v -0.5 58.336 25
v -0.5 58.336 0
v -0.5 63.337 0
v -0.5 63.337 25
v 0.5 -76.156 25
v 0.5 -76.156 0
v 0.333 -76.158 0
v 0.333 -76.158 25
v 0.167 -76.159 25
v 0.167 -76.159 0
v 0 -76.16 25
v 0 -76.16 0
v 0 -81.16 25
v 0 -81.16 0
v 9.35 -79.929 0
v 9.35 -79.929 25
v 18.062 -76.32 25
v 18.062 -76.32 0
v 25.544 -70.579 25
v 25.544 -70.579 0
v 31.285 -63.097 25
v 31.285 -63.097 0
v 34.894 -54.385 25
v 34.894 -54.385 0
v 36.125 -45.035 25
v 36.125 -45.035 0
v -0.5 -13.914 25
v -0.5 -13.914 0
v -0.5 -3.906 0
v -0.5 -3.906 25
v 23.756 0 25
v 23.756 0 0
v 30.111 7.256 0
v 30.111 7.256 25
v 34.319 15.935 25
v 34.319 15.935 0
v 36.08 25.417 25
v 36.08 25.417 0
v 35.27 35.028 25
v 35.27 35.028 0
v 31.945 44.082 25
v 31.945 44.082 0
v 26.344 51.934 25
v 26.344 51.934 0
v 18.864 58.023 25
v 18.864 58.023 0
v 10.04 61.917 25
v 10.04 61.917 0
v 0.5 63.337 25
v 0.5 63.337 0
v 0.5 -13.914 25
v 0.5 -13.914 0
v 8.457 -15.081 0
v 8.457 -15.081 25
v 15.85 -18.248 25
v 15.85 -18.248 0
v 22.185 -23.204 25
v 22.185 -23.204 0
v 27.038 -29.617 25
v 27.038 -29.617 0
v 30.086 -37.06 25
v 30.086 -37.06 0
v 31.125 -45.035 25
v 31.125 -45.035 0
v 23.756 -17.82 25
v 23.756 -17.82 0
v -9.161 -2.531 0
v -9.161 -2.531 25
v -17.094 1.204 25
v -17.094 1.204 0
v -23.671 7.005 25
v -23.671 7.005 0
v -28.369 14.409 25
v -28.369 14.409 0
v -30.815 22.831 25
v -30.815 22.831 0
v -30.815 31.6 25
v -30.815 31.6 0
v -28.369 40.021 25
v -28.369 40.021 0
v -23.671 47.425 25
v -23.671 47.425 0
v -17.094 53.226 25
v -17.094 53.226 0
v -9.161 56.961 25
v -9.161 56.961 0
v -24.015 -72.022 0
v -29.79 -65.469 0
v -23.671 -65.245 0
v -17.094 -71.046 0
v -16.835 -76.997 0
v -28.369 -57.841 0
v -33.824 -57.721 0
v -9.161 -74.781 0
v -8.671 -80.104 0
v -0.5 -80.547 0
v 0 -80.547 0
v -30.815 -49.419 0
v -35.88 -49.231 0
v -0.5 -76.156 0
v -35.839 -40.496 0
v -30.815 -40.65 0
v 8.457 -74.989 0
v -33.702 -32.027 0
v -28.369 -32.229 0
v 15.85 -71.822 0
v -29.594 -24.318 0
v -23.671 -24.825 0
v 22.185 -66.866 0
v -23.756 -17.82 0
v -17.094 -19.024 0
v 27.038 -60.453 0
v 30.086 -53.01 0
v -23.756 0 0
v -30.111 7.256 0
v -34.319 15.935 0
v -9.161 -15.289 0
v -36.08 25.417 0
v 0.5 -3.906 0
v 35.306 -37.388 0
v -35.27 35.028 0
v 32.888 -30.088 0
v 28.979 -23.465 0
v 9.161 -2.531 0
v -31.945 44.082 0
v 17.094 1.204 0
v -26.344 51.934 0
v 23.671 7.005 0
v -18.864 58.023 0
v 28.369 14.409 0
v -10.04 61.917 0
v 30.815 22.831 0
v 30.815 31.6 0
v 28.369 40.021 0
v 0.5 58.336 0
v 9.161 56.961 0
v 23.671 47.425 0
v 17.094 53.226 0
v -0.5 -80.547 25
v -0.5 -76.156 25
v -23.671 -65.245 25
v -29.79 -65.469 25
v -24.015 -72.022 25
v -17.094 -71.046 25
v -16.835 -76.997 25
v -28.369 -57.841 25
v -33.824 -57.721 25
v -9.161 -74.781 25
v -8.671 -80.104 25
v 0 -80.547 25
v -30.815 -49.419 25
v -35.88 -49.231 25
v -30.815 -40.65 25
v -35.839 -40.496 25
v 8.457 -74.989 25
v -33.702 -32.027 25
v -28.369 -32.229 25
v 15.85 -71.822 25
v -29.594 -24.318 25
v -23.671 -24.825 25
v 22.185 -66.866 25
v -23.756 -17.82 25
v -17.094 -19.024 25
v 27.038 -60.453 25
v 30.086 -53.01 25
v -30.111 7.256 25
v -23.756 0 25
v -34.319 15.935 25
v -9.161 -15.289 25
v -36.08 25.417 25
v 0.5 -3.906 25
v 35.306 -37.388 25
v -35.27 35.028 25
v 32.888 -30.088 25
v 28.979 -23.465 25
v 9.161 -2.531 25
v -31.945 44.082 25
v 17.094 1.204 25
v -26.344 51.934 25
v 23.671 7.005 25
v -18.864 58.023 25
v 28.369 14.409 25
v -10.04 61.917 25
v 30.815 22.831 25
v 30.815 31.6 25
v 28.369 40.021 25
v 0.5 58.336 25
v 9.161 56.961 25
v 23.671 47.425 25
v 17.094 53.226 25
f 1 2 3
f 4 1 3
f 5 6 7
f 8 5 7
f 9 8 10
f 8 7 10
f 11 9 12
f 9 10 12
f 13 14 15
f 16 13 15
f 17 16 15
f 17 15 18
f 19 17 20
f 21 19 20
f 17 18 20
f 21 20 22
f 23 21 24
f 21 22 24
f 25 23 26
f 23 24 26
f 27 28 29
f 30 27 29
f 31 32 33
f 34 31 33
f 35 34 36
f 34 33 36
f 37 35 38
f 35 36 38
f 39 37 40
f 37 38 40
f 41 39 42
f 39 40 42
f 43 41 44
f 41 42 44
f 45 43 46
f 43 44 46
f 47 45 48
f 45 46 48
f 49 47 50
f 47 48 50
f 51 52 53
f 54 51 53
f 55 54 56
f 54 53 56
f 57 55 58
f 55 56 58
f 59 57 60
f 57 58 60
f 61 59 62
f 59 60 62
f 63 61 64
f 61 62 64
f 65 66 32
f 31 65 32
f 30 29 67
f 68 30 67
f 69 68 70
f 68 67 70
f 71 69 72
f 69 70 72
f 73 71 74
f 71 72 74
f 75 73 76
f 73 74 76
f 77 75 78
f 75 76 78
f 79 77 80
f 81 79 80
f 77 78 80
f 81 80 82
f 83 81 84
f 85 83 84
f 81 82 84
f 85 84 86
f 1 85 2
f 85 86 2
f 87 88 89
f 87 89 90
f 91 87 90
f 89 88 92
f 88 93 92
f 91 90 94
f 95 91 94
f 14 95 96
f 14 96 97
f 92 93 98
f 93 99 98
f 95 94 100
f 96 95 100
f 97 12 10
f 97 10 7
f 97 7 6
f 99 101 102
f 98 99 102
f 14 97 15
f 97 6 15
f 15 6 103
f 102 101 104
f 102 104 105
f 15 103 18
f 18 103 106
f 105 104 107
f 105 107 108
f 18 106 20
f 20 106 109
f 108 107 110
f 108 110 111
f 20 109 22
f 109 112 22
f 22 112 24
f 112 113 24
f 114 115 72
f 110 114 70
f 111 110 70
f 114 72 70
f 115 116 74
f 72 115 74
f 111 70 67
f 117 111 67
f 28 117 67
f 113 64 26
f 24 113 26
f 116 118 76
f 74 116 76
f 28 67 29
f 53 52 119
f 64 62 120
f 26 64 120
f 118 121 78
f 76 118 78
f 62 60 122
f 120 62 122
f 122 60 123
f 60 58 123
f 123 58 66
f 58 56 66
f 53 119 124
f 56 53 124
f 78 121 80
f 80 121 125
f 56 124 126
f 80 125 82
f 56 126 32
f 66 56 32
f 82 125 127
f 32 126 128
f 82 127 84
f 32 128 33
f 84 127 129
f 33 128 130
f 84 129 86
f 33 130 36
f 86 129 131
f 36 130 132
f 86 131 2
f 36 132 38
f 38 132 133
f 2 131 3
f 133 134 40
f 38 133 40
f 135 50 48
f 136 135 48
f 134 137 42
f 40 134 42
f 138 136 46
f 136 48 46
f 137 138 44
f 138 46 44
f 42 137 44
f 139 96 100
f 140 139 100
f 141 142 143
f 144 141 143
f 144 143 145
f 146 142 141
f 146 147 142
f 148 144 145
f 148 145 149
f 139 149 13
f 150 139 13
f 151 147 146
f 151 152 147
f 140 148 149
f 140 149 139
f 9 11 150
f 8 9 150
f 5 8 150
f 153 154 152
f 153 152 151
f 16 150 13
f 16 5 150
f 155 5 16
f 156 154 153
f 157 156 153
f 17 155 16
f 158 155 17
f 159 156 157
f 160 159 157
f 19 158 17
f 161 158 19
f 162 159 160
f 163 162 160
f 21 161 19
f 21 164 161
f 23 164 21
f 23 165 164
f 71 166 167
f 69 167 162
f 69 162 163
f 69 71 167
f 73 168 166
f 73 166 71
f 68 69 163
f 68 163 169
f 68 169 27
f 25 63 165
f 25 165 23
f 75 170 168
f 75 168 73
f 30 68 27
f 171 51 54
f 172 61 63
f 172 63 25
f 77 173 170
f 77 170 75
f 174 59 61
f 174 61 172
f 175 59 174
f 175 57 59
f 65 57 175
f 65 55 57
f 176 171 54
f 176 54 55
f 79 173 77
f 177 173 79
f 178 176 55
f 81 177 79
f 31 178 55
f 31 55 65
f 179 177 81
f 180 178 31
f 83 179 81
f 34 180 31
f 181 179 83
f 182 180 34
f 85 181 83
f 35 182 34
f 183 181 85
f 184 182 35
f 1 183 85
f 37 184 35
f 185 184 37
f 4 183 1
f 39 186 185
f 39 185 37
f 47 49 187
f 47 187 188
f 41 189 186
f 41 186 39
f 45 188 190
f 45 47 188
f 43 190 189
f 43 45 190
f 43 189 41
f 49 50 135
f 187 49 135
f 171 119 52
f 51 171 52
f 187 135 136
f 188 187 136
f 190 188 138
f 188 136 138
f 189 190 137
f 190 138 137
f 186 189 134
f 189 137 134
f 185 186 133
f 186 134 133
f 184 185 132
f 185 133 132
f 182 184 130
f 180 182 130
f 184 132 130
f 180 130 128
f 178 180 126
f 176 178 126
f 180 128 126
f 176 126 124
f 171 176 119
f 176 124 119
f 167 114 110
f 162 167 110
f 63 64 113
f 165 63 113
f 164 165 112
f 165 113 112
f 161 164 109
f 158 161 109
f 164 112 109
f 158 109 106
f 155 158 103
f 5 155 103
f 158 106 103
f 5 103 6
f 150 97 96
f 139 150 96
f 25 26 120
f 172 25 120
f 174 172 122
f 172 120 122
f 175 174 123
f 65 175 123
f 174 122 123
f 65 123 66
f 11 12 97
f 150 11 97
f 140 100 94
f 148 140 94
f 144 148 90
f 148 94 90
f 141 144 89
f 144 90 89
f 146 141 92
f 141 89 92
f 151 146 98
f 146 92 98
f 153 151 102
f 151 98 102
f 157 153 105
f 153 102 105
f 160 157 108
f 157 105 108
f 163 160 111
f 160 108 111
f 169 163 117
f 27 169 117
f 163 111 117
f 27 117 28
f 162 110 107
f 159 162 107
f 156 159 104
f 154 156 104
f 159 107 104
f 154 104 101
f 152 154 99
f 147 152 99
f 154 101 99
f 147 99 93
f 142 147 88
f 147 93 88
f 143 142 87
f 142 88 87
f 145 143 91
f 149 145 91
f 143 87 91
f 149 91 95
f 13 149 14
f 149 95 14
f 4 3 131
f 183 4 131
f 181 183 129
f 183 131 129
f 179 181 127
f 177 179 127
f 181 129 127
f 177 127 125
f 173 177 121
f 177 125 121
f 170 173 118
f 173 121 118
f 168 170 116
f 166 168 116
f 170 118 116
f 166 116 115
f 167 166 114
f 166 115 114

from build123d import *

# Parameters (mm, degrees)
F1_DEPTH = 25


with BuildPart() as f1:
    # F0 (on Top) → F1 (new body)
    with BuildSketch(Plane.XY):
        with BuildLine():
            ThreePointArc((-0.5, -3.905880259), (-31.125, 27.2151034176), (-0.5, 58.3360870942))
            Line((-0.5, 58.3360870942), (-0.5, 63.3366430443))
            ThreePointArc((-0.5, 63.3366430443), (-33.9112453853, 39.6667322838), (-23.756131229, 0))
            ThreePointArc((-23.756131229, 0), (-12.9197959363, -6.5205527634), (-0.5, -8.906436209))
            Line((-0.5, -8.906436209), (-0.5, -3.905880259))
        make_face()
        with BuildLine():
            Line((-0.5, -8.9133569557), (-0.5, -8.906436209))
            ThreePointArc((-0.5, -8.906436209), (-12.9197959363, -6.5205527634), (-23.756131229, 0))
            Line((-23.756131229, 0), (-23.756131229, -17.8197931647))
            ThreePointArc((-23.756131229, -17.8197931647), (-12.9197959363, -11.2992404013), (-0.5, -8.9133569557))
        make_face()
        with BuildLine():
            ThreePointArc((0.5, 58.3360870942), (31.125, 27.2151034176), (0.5, -3.905880259))
            Line((0.5, -3.905880259), (0.5, -8.906436209))
            ThreePointArc((0.5, -8.906436209), (12.9197959363, -6.5205527634), (23.756131229, 0))
            ThreePointArc((23.756131229, 0), (33.9112453853, 39.6667322838), (0.5, 63.3366430443))
            Line((0.5, 63.3366430443), (0.5, 58.3360870942))
        make_face()
        with BuildLine():
            Line((-0.5, -13.9139129058), (-0.5, -8.9133569557))
            ThreePointArc((-0.5, -8.9133569557), (-12.9197959363, -11.2992404013), (-23.756131229, -17.8197931647))
            ThreePointArc((-23.756131229, -17.8197931647), (-33.8242607899, -57.7209127821), (0, -81.1598965824))
            Line((0, -81.1598965824), (0, -80.5474147201))
            Line((0, -80.5474147201), (-0.5, -80.5474147201))
            Line((-0.5, -80.5474147201), (-0.5, -76.155880259))
            ThreePointArc((-0.5, -76.155880259), (-31.125, -45.0348965824), (-0.5, -13.9139129058))
        make_face()
        with BuildLine():
            ThreePointArc((23.756131229, 0), (12.9197959363, -6.5205527634), (0.5, -8.906436209))
            Line((0.5, -8.906436209), (0.5, -8.9133569557))
            ThreePointArc((0.5, -8.9133569557), (12.9197959363, -11.2992404013), (23.756131229, -17.8197931647))
            Line((23.756131229, -17.8197931647), (23.756131229, 0))
        make_face()
        with BuildLine():
            ThreePointArc((23.756131229, -17.8197931647), (12.9197959363, -11.2992404013), (0.5, -8.9133569557))
            Line((0.5, -8.9133569557), (0.5, -13.9139129058))
            ThreePointArc((0.5, -13.9139129058), (22.1847709589, -23.2036904201), (31.125, -45.0348965824))
            ThreePointArc((31.125, -45.0348965824), (22.1847709589, -66.8661027446), (0.5, -76.155880259))
            ThreePointArc((0.5, -76.155880259), (0.2500080653, -76.1588924853), (0, -76.1598965824))
            Line((0, -76.1598965824), (0, -80.5474147201))
            Line((0, -80.5474147201), (0, -81.1598965824))
            ThreePointArc((0, -81.1598965824), (25.5442324704, -70.5791290527), (36.125, -45.0348965824))
            ThreePointArc((36.125, -45.0348965824), (32.8877322542, -30.0879004903), (23.756131229, -17.8197931647))
        make_face()
    extrude(amount=F1_DEPTH)


solid = f1.part
